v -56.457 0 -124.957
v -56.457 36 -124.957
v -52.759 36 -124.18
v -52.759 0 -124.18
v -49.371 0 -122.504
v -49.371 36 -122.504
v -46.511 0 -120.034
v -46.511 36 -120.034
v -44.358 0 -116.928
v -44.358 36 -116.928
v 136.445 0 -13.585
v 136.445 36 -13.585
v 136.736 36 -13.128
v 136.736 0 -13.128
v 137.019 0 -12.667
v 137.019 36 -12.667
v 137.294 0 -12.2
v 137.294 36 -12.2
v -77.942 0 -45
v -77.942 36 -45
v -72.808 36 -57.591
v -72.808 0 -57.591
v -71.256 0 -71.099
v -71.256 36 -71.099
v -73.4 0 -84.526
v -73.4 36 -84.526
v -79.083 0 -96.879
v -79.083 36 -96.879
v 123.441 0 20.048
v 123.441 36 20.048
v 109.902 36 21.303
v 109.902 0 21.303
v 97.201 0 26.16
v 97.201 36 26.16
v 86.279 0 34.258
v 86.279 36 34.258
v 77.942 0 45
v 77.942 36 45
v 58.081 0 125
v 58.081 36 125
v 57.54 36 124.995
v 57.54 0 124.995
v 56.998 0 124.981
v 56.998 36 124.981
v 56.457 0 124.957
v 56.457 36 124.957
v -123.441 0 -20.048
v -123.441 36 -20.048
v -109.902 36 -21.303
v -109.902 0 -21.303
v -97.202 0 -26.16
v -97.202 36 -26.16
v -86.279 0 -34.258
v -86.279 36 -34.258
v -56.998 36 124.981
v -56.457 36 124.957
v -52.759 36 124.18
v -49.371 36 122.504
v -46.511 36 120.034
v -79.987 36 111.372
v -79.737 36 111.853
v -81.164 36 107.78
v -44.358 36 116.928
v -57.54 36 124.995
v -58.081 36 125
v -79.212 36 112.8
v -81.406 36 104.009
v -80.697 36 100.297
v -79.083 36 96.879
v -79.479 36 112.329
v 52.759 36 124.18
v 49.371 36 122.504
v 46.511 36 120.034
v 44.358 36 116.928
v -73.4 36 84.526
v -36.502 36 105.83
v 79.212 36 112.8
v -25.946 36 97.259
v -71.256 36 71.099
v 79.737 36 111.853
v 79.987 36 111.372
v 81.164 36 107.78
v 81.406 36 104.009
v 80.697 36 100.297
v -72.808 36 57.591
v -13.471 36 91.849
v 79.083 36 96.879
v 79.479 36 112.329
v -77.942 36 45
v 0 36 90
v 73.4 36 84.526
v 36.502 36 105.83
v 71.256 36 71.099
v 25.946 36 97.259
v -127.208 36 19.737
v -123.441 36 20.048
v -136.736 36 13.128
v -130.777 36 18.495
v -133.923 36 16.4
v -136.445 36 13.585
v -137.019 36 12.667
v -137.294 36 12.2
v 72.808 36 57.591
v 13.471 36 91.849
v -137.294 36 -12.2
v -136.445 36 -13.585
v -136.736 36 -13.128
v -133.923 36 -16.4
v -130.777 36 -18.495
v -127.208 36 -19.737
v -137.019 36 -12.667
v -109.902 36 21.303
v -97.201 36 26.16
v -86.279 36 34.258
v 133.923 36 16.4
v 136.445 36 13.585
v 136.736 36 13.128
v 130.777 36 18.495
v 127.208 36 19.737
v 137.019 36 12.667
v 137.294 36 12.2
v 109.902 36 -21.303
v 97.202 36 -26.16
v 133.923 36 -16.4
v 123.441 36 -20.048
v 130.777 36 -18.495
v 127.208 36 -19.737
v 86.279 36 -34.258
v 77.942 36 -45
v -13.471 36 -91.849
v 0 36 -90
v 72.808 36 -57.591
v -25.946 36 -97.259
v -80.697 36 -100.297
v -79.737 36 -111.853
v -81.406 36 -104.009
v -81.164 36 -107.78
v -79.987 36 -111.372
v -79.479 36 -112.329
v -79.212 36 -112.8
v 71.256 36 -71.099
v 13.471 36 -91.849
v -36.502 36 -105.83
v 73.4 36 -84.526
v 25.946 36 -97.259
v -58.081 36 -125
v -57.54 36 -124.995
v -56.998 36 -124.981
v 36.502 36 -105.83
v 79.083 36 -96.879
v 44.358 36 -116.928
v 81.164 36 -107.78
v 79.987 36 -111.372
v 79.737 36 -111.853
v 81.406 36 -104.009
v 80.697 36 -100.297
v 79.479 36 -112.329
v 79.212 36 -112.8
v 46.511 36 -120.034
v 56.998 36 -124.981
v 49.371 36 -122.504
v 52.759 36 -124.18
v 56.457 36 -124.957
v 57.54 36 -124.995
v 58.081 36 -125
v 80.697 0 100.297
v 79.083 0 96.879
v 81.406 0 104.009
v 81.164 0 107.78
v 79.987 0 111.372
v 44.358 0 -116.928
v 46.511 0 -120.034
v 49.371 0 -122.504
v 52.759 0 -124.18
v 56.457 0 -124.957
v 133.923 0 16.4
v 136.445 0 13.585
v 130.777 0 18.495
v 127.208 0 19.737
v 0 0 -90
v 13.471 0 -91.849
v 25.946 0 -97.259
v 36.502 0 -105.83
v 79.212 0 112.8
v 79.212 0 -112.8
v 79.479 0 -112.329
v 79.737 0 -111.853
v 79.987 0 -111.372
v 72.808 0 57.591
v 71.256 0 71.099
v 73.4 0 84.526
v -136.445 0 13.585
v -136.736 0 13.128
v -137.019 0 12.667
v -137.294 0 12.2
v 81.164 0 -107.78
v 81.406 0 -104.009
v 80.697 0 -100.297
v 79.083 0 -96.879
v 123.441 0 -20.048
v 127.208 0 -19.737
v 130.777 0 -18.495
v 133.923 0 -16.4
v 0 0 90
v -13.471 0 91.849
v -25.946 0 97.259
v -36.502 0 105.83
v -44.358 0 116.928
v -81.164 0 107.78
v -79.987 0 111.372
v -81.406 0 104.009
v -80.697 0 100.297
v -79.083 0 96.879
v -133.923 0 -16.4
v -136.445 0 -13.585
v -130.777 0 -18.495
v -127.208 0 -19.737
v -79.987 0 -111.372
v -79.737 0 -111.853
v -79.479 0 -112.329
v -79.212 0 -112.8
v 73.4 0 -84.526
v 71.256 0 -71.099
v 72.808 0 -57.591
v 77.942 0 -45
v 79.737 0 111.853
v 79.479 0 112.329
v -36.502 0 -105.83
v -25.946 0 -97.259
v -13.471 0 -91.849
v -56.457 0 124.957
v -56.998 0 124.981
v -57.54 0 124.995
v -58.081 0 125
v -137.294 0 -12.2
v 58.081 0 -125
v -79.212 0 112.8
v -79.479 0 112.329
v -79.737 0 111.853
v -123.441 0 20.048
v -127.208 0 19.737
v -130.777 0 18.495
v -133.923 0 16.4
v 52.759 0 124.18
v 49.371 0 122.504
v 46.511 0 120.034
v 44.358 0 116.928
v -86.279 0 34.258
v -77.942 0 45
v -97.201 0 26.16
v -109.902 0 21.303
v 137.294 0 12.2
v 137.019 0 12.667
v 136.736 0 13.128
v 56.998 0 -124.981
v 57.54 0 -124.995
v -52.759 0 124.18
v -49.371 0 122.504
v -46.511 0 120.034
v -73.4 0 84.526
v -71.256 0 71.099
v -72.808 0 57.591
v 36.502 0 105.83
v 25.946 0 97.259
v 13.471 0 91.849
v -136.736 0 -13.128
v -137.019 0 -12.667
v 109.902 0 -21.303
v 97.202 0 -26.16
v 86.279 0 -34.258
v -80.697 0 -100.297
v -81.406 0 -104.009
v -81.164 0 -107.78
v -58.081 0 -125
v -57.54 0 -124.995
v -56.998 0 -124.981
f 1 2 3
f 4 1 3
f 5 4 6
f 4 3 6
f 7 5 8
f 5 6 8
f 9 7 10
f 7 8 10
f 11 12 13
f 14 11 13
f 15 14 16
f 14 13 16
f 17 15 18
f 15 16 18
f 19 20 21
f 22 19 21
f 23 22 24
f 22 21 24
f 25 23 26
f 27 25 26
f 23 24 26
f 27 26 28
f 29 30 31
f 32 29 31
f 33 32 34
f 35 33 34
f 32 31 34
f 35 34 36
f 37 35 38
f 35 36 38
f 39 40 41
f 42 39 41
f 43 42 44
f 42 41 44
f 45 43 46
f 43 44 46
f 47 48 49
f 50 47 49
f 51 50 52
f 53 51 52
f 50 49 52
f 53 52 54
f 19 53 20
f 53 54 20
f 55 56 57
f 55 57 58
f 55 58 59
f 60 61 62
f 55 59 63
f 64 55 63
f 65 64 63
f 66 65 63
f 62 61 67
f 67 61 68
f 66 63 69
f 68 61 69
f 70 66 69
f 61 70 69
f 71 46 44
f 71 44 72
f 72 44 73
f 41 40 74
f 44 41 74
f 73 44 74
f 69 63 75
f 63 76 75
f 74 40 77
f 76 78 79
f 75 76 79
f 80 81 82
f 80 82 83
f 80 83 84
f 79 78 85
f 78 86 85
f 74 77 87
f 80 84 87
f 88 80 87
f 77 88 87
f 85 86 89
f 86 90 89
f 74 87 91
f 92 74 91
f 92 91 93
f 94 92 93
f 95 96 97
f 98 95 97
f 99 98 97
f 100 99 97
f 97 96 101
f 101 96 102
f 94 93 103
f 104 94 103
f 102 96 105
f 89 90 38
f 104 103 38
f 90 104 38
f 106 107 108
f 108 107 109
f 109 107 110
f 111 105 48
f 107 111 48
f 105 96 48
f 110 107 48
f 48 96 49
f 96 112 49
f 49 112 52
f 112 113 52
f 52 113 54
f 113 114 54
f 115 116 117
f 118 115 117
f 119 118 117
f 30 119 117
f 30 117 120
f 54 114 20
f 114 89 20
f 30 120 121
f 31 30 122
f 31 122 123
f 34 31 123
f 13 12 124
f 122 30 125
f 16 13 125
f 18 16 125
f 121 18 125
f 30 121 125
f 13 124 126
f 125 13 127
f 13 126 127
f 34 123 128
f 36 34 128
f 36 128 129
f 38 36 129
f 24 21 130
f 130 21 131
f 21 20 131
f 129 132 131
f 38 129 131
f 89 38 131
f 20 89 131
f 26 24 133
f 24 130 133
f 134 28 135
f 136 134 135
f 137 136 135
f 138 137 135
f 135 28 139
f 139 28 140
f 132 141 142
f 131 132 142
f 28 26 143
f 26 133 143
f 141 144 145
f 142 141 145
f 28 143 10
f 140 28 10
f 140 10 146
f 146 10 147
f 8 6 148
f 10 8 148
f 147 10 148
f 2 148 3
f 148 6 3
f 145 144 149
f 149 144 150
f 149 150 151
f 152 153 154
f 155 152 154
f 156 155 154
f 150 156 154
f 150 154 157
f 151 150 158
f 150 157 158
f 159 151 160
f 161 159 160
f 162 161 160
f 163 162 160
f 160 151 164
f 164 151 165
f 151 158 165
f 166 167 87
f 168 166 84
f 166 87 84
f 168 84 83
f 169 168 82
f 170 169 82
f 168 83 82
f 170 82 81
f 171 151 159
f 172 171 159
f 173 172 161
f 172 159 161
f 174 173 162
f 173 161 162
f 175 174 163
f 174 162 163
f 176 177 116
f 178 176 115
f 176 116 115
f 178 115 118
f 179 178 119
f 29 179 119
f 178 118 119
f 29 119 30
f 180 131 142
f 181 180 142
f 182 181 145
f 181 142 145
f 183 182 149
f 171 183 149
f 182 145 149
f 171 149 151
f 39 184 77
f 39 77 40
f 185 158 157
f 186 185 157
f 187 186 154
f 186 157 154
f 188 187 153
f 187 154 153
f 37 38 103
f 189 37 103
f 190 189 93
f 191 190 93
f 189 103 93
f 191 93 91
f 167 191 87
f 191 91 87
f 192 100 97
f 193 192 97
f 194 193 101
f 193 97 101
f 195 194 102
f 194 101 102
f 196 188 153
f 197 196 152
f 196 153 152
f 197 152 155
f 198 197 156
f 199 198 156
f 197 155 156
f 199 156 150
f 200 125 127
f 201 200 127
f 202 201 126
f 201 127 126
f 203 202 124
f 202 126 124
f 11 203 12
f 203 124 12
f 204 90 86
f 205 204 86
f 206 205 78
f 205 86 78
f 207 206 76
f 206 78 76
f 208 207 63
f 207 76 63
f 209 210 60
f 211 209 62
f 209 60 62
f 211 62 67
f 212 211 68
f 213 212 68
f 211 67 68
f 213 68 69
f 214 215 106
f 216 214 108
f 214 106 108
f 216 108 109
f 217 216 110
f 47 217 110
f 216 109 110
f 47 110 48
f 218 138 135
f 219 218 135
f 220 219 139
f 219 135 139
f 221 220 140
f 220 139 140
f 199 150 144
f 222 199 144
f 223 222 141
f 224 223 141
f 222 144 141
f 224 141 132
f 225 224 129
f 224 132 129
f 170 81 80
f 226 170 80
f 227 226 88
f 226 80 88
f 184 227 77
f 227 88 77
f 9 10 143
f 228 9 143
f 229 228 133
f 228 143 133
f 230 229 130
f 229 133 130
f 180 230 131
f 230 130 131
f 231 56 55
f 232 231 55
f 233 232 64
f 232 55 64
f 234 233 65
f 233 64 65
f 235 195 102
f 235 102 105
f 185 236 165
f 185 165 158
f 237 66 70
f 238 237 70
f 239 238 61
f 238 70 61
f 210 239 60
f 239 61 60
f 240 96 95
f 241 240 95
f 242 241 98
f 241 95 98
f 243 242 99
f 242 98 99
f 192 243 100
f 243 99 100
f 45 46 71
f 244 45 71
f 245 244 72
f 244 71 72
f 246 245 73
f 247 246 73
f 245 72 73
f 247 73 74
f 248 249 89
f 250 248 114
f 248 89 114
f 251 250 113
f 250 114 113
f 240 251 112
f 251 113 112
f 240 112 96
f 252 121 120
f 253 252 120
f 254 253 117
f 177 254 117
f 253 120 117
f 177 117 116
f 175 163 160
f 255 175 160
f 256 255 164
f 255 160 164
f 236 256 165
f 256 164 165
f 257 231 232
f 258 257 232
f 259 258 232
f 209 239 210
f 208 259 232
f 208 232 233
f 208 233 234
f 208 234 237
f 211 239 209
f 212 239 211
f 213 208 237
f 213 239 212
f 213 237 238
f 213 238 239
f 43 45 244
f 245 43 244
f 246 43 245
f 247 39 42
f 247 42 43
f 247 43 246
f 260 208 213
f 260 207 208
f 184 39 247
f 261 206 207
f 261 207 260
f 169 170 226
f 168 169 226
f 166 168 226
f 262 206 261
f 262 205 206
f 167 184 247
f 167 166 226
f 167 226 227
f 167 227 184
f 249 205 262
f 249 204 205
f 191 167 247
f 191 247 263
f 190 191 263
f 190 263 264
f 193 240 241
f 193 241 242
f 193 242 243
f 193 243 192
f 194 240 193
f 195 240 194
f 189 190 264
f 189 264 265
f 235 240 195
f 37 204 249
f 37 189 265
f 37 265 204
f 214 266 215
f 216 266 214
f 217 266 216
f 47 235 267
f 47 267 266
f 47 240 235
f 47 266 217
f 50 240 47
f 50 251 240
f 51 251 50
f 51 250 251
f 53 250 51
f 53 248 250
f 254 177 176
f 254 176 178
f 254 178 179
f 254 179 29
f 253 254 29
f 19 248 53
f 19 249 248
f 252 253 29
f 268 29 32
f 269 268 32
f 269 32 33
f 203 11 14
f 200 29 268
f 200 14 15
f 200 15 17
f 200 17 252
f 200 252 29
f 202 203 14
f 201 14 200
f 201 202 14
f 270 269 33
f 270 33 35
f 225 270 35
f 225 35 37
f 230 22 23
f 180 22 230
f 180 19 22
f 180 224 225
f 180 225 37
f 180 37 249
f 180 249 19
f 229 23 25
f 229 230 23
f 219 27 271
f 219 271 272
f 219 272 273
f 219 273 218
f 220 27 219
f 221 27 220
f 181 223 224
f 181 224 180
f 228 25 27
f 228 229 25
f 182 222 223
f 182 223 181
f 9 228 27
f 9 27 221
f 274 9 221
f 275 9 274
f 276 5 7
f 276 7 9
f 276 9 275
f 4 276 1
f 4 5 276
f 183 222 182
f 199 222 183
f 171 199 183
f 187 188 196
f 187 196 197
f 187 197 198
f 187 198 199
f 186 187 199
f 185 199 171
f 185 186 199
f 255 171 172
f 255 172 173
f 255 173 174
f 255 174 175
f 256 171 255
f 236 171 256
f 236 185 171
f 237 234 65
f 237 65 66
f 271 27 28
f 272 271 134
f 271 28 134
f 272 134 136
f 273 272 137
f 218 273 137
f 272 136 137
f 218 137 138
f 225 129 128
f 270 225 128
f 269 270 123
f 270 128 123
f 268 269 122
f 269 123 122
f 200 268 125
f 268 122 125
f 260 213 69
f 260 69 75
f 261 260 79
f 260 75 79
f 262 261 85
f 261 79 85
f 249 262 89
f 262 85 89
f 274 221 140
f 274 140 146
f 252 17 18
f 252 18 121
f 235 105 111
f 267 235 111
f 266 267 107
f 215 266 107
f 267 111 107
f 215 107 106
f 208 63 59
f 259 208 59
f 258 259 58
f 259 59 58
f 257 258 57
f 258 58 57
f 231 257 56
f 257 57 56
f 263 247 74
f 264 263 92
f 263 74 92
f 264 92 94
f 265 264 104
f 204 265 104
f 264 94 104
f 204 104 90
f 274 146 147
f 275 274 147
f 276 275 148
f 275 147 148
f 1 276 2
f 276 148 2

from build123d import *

# Parameters (mm, degrees)
BOSS_EXTRUDE1_DEPTH = 36
CIRPATTERN1_COUNT   = 6
CUT_EXTRUDE3_DEPTH  = 36
CUT_EXTRUDE9_DEPTH  = 36


with BuildPart() as part:
    # Sketch2 → Boss-Extrude1 (new body)
    with BuildSketch(Plane(origin=(0, 0, 0), x_dir=(1, 0, 0), z_dir=(0, 1, 0))):
        Polygon((0, 125), (-58.08143708, 125), (-79.212456933, 112.8), (-108.253175473, 62.5), (0, 0), align=None)
    boss_extrude1 = extrude(amount=BOSS_EXTRUDE1_DEPTH)

    # CirPattern1: Boss-Extrude1 ×6 about axis
    cirpattern1_axis = Axis((0, 36, 0), (0, -1, 0))
    for i in range(1, CIRPATTERN1_COUNT):
        add(boss_extrude1.rotate(cirpattern1_axis, i * 360 / CIRPATTERN1_COUNT))

    # Sketch4 → Cut-Extrude3 (cut)
    with BuildSketch(Plane(origin=(0, 36, 0), x_dir=(1, 0, 0), z_dir=(0, 1, 0))):
        with BuildLine():
            Line((79.212456933, -112.8), (137.293894013, -12.2))
            ThreePointArc((137.293894013, -12.2), (125.5592118, -23.716902798), (109.56410095, -27.524558982))
            ThreePointArc((109.56410095, -27.524558982), (77.942286341, -45), (78.619017782, -81.123015275))
            ThreePointArc((78.619017782, -81.123015275), (83.319046223, -96.879015699), (79.212456933, -112.8))
        make_face()
        with BuildLine():
            Line((137.293894013, 12.2), (79.212456933, 112.8))
            ThreePointArc((79.212456933, 112.8), (83.319046223, 96.879015699), (78.619017782, 81.123015275))
            ThreePointArc((78.619017782, 81.123015275), (77.942286341, 45), (109.56410095, 27.524558982))
            ThreePointArc((109.56410095, 27.524558982), (125.5592118, 23.716902798), (137.293894013, 12.2))
        make_face()
        with BuildLine():
            Line((58.08143708, 125), (-58.08143708, 125))
            ThreePointArc((-58.08143708, 125), (-42.240165578, 120.595918497), (-30.945083169, 108.647574257))
            ThreePointArc((-30.945083169, 108.647574257), (0, 90), (30.945083169, 108.647574257))
            ThreePointArc((30.945083169, 108.647574257), (42.240165578, 120.595918497), (58.08143708, 125))
        make_face()
        with BuildLine():
            Line((-79.212456933, 112.8), (-137.293894013, 12.2))
            ThreePointArc((-137.293894013, 12.2), (-125.5592118, 23.716902798), (-109.56410095, 27.524558982))
            ThreePointArc((-109.56410095, 27.524558982), (-77.942286341, 45), (-78.619017782, 81.123015275))
            ThreePointArc((-78.619017782, 81.123015275), (-83.319046223, 96.879015699), (-79.212456933, 112.8))
        make_face()
        with BuildLine():
            Line((-137.293894013, -12.2), (-79.212456933, -112.8))
            ThreePointArc((-79.212456933, -112.8), (-83.319046223, -96.879015699), (-78.619017782, -81.123015275))
            ThreePointArc((-78.619017782, -81.123015275), (-77.942286341, -45), (-109.56410095, -27.524558982))
            ThreePointArc((-109.56410095, -27.524558982), (-125.5592118, -23.716902798), (-137.293894013, -12.2))
        make_face()
        with BuildLine():
            Line((-58.08143708, -125), (58.08143708, -125))
            ThreePointArc((58.08143708, -125), (42.240165578, -120.595918497), (30.945083169, -108.647574257))
            ThreePointArc((30.945083169, -108.647574257), (0, -90), (-30.945083169, -108.647574257))
            ThreePointArc((-30.945083169, -108.647574257), (-42.240165578, -120.595918497), (-58.08143708, -125))
        make_face()
    extrude(amount=-CUT_EXTRUDE3_DEPTH, mode=Mode.SUBTRACT)

    # Sketch9 → Cut-Extrude9 (cut)
    with BuildSketch(Plane(origin=(0, 36, 0), x_dir=(1, 0, 0), z_dir=(0, 1, 0))):
        with BuildLine():
            Line((57.250180902, 125), (-57.250180902, 125))
            ThreePointArc((-57.250180902, 125), (-49.705136426, 122.71904735), (-44.358314608, 116.927507176))
            ThreePointArc((-44.358314608, 116.927507176), (0, 90), (44.358314608, 116.927507176))
            ThreePointArc((44.358314608, 116.927507176), (49.705136426, 122.71904735), (57.250180902, 125))
        make_face()
        with BuildLine():
            Line((136.878265924, 12.919888968), (79.628085022, 112.080111032))
            ThreePointArc((79.628085022, 112.080111032), (81.425244321, 104.405434518), (79.083034312, 96.879180908))
            ThreePointArc((79.083034312, 96.879180908), (77.942286341, 45), (123.44134892, 20.048326268))
            ThreePointArc((123.44134892, 20.048326268), (131.130380747, 18.313612832), (136.878265924, 12.919888968))
        make_face()
        with BuildLine():
            Line((79.628085022, -112.080111032), (136.878265924, -12.919888968))
            ThreePointArc((136.878265924, -12.919888968), (131.130380747, -18.313612832), (123.44134892, -20.048326268))
            ThreePointArc((123.44134892, -20.048326268), (77.942286341, -45), (79.083034312, -96.879180908))
            ThreePointArc((79.083034312, -96.879180908), (81.425244321, -104.405434518), (79.628085022, -112.080111032))
        make_face()
        with BuildLine():
            Line((-57.250180902, -125), (57.250180902, -125))
            ThreePointArc((57.250180902, -125), (49.705136426, -122.71904735), (44.358314608, -116.927507176))
            ThreePointArc((44.358314608, -116.927507176), (0, -90), (-44.358314608, -116.927507176))
            ThreePointArc((-44.358314608, -116.927507176), (-49.705136426, -122.71904735), (-57.250180902, -125))
        make_face()
        with BuildLine():
            Line((-136.878265924, -12.919888968), (-79.628085022, -112.080111032))
            ThreePointArc((-79.628085022, -112.080111032), (-81.425244321, -104.405434518), (-79.083034312, -96.879180908))
            ThreePointArc((-79.083034312, -96.879180908), (-77.942286341, -45), (-123.44134892, -20.048326268))
            ThreePointArc((-123.44134892, -20.048326268), (-131.130380747, -18.313612832), (-136.878265924, -12.919888968))
        make_face()
        with BuildLine():
            Line((-79.628085022, 112.080111032), (-136.878265924, 12.919888968))
            ThreePointArc((-136.878265924, 12.919888968), (-131.130380747, 18.313612832), (-123.44134892, 20.048326268))
            ThreePointArc((-123.44134892, 20.048326268), (-77.942286341, 45), (-79.083034312, 96.879180908))
            ThreePointArc((-79.083034312, 96.879180908), (-81.425244321, 104.405434518), (-79.628085022, 112.080111032))
        make_face()
    extrude(amount=-CUT_EXTRUDE9_DEPTH, mode=Mode.SUBTRACT)


solid = part.part
